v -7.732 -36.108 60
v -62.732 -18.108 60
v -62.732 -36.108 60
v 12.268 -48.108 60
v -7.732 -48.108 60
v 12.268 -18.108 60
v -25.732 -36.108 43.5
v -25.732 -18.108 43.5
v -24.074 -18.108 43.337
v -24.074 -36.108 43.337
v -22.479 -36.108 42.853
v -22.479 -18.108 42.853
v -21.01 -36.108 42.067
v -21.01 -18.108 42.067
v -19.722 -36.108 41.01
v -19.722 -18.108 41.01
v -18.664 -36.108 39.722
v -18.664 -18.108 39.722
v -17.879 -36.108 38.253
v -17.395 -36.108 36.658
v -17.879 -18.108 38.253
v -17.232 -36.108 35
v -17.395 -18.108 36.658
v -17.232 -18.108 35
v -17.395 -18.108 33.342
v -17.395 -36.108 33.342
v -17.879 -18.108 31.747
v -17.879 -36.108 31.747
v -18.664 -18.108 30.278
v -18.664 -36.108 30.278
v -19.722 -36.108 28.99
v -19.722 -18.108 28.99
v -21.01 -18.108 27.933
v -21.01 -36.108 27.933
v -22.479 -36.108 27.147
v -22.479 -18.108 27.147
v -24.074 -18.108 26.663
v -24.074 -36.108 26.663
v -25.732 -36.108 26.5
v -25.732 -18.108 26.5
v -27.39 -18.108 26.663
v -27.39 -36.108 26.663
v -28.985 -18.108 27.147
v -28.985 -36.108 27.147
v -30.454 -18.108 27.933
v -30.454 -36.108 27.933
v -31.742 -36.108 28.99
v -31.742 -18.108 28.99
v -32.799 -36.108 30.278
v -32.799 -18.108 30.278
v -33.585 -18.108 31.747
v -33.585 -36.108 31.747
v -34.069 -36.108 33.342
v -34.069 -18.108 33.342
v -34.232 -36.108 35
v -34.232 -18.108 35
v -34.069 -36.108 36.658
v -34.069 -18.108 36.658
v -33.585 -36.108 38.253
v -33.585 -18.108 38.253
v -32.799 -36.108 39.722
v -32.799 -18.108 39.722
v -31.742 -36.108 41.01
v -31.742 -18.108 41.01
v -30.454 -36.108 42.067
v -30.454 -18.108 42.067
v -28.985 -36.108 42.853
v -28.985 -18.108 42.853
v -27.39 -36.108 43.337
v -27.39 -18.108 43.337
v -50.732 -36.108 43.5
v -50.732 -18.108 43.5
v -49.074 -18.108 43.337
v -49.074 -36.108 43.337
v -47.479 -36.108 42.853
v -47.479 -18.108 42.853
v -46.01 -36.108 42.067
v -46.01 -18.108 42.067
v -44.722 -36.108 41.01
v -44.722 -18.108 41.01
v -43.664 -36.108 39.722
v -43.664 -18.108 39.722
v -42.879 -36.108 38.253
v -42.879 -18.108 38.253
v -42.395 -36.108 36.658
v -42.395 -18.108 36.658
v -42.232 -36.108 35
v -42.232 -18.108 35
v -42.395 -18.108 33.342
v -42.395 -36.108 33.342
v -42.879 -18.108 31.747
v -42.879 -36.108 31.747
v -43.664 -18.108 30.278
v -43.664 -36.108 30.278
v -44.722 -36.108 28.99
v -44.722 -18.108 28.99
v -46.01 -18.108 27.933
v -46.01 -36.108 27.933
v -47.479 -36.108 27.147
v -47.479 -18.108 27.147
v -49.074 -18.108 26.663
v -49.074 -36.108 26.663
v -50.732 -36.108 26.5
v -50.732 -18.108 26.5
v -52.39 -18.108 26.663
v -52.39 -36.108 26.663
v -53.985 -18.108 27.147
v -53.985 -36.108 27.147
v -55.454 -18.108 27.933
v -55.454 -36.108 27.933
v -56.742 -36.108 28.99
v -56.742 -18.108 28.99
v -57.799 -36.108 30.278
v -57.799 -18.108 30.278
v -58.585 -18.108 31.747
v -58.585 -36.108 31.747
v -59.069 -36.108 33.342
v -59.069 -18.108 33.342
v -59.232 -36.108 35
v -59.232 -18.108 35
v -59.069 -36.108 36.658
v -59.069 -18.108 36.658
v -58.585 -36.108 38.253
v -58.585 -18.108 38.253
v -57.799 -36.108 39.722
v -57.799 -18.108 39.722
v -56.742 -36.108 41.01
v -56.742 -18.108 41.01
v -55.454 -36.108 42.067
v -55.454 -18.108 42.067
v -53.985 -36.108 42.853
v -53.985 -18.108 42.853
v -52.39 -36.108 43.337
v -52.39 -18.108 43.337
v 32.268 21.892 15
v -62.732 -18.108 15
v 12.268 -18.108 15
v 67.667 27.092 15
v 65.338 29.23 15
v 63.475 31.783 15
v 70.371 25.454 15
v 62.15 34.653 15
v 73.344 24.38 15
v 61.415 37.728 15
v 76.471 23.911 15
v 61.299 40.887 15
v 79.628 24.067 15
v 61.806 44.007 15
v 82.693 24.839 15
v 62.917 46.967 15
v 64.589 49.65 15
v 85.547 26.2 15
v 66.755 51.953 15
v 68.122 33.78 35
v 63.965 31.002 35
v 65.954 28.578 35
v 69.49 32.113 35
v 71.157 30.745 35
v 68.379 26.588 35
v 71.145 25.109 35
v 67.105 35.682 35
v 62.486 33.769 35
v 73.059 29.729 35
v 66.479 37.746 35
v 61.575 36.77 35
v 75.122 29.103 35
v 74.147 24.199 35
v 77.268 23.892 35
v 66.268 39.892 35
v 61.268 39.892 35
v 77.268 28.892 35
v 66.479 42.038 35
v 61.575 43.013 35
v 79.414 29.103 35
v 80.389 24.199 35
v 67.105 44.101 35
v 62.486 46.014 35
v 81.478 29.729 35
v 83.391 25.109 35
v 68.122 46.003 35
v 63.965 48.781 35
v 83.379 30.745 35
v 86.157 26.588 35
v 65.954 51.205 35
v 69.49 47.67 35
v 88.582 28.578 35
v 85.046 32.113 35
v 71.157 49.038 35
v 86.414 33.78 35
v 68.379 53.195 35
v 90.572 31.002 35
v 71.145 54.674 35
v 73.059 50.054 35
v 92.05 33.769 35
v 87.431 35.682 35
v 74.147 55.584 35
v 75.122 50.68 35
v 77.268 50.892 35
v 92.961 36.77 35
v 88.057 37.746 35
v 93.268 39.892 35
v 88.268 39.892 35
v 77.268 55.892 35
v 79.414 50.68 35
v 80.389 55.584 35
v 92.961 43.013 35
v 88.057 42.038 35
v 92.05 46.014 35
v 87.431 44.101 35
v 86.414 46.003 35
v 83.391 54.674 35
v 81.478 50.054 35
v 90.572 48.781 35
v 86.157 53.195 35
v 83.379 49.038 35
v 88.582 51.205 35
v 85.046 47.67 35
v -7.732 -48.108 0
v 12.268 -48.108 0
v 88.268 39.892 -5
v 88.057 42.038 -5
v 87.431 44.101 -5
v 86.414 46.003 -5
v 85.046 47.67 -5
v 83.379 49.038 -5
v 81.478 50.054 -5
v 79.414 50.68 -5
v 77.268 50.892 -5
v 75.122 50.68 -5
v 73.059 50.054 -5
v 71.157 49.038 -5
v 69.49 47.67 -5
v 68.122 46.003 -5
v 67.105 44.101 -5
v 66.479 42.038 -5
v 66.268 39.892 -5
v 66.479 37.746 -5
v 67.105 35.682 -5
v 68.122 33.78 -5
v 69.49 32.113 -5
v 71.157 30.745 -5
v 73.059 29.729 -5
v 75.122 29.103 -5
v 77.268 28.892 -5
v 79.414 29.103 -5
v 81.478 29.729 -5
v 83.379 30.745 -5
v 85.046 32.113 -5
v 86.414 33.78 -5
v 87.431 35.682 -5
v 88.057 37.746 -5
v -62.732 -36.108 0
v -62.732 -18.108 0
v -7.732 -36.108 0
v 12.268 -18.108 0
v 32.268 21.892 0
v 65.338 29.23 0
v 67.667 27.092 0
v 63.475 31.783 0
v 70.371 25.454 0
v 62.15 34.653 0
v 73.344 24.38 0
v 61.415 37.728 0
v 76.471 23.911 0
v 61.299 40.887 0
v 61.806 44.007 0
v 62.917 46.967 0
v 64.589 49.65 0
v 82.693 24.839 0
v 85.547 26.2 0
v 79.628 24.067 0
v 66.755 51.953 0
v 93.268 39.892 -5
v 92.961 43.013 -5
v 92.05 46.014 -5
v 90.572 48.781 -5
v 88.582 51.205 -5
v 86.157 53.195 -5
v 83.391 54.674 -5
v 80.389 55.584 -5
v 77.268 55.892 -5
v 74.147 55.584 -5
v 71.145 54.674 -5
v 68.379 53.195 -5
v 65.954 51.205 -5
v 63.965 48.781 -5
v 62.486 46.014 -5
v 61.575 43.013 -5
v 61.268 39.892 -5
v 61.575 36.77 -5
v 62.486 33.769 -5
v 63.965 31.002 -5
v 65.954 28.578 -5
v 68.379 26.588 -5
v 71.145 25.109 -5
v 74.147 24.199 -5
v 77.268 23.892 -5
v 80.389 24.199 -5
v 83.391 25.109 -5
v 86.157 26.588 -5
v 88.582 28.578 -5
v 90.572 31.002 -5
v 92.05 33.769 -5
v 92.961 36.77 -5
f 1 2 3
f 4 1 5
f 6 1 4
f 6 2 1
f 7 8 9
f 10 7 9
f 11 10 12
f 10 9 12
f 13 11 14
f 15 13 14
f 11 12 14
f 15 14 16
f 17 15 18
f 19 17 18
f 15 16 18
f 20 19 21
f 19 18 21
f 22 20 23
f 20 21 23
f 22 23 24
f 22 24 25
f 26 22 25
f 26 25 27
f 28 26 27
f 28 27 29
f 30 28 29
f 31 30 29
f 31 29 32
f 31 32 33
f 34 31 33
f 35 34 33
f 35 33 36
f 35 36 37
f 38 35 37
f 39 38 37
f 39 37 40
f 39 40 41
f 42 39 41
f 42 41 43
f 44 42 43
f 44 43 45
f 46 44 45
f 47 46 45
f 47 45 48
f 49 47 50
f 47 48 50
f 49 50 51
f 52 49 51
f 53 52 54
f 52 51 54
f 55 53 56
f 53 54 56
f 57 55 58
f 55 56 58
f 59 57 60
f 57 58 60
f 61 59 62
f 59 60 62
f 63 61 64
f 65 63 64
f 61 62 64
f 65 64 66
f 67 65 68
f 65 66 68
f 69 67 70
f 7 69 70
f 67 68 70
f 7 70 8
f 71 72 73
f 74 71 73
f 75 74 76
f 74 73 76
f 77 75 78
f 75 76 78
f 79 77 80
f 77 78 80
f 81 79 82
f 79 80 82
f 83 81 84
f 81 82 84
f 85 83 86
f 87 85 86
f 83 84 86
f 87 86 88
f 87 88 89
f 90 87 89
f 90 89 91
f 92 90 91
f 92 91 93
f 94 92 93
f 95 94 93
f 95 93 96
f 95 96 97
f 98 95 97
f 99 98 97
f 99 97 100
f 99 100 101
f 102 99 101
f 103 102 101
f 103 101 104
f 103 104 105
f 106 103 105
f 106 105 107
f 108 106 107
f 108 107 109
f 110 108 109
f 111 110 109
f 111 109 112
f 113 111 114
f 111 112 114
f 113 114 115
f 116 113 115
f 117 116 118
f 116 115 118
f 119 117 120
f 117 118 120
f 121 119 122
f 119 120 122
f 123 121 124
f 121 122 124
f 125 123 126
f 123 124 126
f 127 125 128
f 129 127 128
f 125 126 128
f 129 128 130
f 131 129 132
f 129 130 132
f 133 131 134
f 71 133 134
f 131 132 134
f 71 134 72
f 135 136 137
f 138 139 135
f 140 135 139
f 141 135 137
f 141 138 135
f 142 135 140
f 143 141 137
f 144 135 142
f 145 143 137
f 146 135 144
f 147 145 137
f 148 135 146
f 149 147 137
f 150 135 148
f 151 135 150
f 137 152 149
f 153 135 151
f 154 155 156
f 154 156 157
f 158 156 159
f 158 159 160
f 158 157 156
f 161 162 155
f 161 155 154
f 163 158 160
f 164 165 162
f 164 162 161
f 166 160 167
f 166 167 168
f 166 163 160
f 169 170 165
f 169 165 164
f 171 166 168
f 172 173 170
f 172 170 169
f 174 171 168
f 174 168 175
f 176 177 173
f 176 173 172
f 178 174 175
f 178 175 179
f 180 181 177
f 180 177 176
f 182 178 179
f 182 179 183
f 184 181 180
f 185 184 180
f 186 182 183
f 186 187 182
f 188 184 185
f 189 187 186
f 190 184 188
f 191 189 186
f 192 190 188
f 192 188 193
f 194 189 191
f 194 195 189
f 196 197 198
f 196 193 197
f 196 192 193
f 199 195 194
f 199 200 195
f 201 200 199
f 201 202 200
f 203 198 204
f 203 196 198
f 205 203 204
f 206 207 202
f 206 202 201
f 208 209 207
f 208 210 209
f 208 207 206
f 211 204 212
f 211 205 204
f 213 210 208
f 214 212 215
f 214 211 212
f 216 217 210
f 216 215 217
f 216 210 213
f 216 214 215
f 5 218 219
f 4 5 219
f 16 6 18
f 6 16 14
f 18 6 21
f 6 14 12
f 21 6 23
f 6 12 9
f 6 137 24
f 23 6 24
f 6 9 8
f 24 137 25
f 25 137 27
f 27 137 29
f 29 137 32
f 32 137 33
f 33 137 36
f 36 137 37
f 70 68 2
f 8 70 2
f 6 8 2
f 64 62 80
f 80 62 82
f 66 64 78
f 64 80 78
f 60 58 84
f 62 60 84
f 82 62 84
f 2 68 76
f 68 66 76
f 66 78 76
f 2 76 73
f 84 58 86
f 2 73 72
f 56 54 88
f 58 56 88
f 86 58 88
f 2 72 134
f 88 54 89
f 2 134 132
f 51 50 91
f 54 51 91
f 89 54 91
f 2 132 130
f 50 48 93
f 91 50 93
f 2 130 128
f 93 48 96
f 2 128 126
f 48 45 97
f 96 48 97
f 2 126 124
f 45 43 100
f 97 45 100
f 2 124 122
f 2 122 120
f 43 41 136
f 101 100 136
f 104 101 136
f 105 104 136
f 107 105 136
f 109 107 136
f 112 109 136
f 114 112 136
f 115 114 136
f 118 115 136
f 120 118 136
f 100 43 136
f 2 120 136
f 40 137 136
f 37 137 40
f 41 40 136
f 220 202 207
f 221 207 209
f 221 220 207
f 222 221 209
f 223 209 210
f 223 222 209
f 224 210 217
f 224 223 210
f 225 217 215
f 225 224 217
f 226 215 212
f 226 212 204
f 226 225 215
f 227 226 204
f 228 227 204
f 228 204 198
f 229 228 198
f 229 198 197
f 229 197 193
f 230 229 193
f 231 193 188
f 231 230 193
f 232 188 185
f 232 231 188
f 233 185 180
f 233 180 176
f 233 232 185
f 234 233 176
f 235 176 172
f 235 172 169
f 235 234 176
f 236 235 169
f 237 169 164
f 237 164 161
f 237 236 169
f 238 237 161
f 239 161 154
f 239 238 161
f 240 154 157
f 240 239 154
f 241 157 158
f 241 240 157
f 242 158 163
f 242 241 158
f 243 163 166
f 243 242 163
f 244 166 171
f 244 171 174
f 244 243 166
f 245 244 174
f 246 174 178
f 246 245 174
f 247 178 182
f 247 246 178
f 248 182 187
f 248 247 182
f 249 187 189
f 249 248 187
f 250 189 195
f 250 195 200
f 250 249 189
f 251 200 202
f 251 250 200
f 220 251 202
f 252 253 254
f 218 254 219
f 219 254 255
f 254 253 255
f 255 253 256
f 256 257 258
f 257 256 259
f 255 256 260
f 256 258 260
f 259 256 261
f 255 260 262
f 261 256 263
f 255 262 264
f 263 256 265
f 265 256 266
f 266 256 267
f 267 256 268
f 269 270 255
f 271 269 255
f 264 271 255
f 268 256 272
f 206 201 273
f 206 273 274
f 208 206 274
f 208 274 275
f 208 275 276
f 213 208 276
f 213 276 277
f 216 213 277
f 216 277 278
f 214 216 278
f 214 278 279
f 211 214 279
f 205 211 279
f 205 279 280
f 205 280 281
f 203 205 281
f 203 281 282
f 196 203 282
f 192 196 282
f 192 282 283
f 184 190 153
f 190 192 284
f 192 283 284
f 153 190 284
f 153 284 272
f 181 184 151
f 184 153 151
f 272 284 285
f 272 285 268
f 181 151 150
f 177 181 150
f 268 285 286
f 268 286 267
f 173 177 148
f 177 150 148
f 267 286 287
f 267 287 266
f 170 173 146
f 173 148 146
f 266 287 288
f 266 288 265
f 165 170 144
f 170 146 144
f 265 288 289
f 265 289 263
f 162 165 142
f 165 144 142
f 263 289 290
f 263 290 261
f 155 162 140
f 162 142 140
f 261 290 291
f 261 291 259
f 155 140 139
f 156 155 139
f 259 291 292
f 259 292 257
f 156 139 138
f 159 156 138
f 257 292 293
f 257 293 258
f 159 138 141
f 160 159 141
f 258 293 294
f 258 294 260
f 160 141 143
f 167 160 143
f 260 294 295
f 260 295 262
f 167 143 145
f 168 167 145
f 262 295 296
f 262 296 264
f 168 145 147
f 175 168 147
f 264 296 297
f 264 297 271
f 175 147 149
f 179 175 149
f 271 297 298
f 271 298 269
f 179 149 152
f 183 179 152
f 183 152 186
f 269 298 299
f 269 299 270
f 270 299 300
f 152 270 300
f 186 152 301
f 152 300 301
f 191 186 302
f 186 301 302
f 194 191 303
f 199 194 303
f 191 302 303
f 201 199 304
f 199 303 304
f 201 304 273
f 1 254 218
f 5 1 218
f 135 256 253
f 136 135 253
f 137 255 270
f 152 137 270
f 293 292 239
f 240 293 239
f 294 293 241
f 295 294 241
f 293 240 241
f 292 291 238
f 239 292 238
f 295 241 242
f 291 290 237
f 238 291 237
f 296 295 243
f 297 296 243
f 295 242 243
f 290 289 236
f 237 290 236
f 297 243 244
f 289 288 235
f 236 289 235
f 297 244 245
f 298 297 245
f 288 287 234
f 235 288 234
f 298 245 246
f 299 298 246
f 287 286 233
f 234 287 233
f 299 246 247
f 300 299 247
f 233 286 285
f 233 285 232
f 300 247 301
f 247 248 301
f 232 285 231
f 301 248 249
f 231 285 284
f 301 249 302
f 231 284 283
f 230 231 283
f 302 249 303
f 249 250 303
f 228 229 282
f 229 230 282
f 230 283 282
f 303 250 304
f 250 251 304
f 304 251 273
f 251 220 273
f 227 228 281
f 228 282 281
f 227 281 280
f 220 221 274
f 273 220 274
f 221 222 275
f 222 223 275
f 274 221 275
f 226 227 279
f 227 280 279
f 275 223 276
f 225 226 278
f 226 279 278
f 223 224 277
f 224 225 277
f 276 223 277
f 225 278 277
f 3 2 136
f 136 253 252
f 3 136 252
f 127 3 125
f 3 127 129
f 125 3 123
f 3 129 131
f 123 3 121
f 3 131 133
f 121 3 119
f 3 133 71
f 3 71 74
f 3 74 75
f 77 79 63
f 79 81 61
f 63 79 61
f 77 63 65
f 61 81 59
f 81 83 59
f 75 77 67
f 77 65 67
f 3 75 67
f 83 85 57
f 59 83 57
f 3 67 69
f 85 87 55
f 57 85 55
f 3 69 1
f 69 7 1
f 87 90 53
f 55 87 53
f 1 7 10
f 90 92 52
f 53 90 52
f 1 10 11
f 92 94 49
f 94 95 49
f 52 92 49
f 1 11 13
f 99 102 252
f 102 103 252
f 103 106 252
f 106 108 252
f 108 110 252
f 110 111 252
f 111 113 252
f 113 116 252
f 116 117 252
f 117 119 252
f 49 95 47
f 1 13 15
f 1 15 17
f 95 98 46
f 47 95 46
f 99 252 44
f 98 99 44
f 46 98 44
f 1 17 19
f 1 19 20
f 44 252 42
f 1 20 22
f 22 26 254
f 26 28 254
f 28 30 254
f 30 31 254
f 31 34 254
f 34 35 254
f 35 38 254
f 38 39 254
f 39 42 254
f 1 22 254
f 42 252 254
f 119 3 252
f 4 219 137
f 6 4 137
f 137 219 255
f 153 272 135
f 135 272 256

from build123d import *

# Parameters (mm, degrees)
BOSS_EXTRUDE1_DEPTH      = 60
BOSS_EXTRUDE2_DEPTH      = 15
BOSS_EXTRUDE3_DEPTH      = 35
BOSS_EXTRUDE3_DEPTH_BACK = 5
SKETCH1_4_R              = 11
SKETCH2_R                = 8.5
CUT_EXTRUDE1_DEPTH       = 35


with BuildPart() as part:
    # Sketch1 → Boss-Extrude1 (new body)
    with BuildSketch(Plane.XY):
        Polygon((-62.731983875, -18.108440156), (-62.731983875, -36.108440156), (-7.731983875, -36.108440156), (-7.731983875, -48.108440156), (12.268016125, -48.108440156), (12.268016125, -18.108440156), align=None)
    extrude(amount=BOSS_EXTRUDE1_DEPTH)

    # Sketch1<3> → Boss-Extrude2 (add)
    with BuildSketch(Plane.XY):
        with BuildLine():
            Line((32.268016125, 21.891559844), (-62.731983875, -18.108440156))
            Line((-62.731983875, -18.108440156), (12.268016125, -18.108440156))
            Line((12.268016125, -18.108440156), (85.546754882, 26.199861359))
            ThreePointArc((85.546754882, 26.199861359), (64.34324961, 30.460215847), (66.754706964, 51.95263613))
            Line((66.754706964, 51.95263613), (32.268016125, 21.891559844))
        make_face()
    extrude(amount=BOSS_EXTRUDE2_DEPTH)

    # Sketch1<4> → Boss-Extrude3 (add, two sides: drawn at the far end of the back side and taken through both)
    with BuildSketch(Plane.XY.offset(-BOSS_EXTRUDE3_DEPTH_BACK)):
        with BuildLine():
            ThreePointArc((66.754706964, 51.95263613), (64.34324961, 30.460215847), (85.546754882, 26.199861359))
            ThreePointArc((85.546754882, 26.199861359), (91.204650285, 32.032156327), (93.268009306, 39.891545268))
            ThreePointArc((93.268009306, 39.891545268), (83.89322803, 54.455414207), (66.754706964, 51.95263613))
        make_face()
        with Locations((77.268019887, 39.891545268)):
            Circle(SKETCH1_4_R, mode=Mode.SUBTRACT)
    extrude(amount=BOSS_EXTRUDE3_DEPTH + BOSS_EXTRUDE3_DEPTH_BACK)

    # Sketch2 → Cut-Extrude1 (cut)
    with BuildSketch(Plane(origin=(0, -18.108440156, 0), x_dir=(1, 0, 0), z_dir=(0, 1, 0))):
        with Locations((-50.731983875, -35)):
            Circle(SKETCH2_R)
        with Locations((-25.731983875, -35)):
            Circle(SKETCH2_R)
    extrude(amount=-CUT_EXTRUDE1_DEPTH, mode=Mode.SUBTRACT)


solid = part.part
